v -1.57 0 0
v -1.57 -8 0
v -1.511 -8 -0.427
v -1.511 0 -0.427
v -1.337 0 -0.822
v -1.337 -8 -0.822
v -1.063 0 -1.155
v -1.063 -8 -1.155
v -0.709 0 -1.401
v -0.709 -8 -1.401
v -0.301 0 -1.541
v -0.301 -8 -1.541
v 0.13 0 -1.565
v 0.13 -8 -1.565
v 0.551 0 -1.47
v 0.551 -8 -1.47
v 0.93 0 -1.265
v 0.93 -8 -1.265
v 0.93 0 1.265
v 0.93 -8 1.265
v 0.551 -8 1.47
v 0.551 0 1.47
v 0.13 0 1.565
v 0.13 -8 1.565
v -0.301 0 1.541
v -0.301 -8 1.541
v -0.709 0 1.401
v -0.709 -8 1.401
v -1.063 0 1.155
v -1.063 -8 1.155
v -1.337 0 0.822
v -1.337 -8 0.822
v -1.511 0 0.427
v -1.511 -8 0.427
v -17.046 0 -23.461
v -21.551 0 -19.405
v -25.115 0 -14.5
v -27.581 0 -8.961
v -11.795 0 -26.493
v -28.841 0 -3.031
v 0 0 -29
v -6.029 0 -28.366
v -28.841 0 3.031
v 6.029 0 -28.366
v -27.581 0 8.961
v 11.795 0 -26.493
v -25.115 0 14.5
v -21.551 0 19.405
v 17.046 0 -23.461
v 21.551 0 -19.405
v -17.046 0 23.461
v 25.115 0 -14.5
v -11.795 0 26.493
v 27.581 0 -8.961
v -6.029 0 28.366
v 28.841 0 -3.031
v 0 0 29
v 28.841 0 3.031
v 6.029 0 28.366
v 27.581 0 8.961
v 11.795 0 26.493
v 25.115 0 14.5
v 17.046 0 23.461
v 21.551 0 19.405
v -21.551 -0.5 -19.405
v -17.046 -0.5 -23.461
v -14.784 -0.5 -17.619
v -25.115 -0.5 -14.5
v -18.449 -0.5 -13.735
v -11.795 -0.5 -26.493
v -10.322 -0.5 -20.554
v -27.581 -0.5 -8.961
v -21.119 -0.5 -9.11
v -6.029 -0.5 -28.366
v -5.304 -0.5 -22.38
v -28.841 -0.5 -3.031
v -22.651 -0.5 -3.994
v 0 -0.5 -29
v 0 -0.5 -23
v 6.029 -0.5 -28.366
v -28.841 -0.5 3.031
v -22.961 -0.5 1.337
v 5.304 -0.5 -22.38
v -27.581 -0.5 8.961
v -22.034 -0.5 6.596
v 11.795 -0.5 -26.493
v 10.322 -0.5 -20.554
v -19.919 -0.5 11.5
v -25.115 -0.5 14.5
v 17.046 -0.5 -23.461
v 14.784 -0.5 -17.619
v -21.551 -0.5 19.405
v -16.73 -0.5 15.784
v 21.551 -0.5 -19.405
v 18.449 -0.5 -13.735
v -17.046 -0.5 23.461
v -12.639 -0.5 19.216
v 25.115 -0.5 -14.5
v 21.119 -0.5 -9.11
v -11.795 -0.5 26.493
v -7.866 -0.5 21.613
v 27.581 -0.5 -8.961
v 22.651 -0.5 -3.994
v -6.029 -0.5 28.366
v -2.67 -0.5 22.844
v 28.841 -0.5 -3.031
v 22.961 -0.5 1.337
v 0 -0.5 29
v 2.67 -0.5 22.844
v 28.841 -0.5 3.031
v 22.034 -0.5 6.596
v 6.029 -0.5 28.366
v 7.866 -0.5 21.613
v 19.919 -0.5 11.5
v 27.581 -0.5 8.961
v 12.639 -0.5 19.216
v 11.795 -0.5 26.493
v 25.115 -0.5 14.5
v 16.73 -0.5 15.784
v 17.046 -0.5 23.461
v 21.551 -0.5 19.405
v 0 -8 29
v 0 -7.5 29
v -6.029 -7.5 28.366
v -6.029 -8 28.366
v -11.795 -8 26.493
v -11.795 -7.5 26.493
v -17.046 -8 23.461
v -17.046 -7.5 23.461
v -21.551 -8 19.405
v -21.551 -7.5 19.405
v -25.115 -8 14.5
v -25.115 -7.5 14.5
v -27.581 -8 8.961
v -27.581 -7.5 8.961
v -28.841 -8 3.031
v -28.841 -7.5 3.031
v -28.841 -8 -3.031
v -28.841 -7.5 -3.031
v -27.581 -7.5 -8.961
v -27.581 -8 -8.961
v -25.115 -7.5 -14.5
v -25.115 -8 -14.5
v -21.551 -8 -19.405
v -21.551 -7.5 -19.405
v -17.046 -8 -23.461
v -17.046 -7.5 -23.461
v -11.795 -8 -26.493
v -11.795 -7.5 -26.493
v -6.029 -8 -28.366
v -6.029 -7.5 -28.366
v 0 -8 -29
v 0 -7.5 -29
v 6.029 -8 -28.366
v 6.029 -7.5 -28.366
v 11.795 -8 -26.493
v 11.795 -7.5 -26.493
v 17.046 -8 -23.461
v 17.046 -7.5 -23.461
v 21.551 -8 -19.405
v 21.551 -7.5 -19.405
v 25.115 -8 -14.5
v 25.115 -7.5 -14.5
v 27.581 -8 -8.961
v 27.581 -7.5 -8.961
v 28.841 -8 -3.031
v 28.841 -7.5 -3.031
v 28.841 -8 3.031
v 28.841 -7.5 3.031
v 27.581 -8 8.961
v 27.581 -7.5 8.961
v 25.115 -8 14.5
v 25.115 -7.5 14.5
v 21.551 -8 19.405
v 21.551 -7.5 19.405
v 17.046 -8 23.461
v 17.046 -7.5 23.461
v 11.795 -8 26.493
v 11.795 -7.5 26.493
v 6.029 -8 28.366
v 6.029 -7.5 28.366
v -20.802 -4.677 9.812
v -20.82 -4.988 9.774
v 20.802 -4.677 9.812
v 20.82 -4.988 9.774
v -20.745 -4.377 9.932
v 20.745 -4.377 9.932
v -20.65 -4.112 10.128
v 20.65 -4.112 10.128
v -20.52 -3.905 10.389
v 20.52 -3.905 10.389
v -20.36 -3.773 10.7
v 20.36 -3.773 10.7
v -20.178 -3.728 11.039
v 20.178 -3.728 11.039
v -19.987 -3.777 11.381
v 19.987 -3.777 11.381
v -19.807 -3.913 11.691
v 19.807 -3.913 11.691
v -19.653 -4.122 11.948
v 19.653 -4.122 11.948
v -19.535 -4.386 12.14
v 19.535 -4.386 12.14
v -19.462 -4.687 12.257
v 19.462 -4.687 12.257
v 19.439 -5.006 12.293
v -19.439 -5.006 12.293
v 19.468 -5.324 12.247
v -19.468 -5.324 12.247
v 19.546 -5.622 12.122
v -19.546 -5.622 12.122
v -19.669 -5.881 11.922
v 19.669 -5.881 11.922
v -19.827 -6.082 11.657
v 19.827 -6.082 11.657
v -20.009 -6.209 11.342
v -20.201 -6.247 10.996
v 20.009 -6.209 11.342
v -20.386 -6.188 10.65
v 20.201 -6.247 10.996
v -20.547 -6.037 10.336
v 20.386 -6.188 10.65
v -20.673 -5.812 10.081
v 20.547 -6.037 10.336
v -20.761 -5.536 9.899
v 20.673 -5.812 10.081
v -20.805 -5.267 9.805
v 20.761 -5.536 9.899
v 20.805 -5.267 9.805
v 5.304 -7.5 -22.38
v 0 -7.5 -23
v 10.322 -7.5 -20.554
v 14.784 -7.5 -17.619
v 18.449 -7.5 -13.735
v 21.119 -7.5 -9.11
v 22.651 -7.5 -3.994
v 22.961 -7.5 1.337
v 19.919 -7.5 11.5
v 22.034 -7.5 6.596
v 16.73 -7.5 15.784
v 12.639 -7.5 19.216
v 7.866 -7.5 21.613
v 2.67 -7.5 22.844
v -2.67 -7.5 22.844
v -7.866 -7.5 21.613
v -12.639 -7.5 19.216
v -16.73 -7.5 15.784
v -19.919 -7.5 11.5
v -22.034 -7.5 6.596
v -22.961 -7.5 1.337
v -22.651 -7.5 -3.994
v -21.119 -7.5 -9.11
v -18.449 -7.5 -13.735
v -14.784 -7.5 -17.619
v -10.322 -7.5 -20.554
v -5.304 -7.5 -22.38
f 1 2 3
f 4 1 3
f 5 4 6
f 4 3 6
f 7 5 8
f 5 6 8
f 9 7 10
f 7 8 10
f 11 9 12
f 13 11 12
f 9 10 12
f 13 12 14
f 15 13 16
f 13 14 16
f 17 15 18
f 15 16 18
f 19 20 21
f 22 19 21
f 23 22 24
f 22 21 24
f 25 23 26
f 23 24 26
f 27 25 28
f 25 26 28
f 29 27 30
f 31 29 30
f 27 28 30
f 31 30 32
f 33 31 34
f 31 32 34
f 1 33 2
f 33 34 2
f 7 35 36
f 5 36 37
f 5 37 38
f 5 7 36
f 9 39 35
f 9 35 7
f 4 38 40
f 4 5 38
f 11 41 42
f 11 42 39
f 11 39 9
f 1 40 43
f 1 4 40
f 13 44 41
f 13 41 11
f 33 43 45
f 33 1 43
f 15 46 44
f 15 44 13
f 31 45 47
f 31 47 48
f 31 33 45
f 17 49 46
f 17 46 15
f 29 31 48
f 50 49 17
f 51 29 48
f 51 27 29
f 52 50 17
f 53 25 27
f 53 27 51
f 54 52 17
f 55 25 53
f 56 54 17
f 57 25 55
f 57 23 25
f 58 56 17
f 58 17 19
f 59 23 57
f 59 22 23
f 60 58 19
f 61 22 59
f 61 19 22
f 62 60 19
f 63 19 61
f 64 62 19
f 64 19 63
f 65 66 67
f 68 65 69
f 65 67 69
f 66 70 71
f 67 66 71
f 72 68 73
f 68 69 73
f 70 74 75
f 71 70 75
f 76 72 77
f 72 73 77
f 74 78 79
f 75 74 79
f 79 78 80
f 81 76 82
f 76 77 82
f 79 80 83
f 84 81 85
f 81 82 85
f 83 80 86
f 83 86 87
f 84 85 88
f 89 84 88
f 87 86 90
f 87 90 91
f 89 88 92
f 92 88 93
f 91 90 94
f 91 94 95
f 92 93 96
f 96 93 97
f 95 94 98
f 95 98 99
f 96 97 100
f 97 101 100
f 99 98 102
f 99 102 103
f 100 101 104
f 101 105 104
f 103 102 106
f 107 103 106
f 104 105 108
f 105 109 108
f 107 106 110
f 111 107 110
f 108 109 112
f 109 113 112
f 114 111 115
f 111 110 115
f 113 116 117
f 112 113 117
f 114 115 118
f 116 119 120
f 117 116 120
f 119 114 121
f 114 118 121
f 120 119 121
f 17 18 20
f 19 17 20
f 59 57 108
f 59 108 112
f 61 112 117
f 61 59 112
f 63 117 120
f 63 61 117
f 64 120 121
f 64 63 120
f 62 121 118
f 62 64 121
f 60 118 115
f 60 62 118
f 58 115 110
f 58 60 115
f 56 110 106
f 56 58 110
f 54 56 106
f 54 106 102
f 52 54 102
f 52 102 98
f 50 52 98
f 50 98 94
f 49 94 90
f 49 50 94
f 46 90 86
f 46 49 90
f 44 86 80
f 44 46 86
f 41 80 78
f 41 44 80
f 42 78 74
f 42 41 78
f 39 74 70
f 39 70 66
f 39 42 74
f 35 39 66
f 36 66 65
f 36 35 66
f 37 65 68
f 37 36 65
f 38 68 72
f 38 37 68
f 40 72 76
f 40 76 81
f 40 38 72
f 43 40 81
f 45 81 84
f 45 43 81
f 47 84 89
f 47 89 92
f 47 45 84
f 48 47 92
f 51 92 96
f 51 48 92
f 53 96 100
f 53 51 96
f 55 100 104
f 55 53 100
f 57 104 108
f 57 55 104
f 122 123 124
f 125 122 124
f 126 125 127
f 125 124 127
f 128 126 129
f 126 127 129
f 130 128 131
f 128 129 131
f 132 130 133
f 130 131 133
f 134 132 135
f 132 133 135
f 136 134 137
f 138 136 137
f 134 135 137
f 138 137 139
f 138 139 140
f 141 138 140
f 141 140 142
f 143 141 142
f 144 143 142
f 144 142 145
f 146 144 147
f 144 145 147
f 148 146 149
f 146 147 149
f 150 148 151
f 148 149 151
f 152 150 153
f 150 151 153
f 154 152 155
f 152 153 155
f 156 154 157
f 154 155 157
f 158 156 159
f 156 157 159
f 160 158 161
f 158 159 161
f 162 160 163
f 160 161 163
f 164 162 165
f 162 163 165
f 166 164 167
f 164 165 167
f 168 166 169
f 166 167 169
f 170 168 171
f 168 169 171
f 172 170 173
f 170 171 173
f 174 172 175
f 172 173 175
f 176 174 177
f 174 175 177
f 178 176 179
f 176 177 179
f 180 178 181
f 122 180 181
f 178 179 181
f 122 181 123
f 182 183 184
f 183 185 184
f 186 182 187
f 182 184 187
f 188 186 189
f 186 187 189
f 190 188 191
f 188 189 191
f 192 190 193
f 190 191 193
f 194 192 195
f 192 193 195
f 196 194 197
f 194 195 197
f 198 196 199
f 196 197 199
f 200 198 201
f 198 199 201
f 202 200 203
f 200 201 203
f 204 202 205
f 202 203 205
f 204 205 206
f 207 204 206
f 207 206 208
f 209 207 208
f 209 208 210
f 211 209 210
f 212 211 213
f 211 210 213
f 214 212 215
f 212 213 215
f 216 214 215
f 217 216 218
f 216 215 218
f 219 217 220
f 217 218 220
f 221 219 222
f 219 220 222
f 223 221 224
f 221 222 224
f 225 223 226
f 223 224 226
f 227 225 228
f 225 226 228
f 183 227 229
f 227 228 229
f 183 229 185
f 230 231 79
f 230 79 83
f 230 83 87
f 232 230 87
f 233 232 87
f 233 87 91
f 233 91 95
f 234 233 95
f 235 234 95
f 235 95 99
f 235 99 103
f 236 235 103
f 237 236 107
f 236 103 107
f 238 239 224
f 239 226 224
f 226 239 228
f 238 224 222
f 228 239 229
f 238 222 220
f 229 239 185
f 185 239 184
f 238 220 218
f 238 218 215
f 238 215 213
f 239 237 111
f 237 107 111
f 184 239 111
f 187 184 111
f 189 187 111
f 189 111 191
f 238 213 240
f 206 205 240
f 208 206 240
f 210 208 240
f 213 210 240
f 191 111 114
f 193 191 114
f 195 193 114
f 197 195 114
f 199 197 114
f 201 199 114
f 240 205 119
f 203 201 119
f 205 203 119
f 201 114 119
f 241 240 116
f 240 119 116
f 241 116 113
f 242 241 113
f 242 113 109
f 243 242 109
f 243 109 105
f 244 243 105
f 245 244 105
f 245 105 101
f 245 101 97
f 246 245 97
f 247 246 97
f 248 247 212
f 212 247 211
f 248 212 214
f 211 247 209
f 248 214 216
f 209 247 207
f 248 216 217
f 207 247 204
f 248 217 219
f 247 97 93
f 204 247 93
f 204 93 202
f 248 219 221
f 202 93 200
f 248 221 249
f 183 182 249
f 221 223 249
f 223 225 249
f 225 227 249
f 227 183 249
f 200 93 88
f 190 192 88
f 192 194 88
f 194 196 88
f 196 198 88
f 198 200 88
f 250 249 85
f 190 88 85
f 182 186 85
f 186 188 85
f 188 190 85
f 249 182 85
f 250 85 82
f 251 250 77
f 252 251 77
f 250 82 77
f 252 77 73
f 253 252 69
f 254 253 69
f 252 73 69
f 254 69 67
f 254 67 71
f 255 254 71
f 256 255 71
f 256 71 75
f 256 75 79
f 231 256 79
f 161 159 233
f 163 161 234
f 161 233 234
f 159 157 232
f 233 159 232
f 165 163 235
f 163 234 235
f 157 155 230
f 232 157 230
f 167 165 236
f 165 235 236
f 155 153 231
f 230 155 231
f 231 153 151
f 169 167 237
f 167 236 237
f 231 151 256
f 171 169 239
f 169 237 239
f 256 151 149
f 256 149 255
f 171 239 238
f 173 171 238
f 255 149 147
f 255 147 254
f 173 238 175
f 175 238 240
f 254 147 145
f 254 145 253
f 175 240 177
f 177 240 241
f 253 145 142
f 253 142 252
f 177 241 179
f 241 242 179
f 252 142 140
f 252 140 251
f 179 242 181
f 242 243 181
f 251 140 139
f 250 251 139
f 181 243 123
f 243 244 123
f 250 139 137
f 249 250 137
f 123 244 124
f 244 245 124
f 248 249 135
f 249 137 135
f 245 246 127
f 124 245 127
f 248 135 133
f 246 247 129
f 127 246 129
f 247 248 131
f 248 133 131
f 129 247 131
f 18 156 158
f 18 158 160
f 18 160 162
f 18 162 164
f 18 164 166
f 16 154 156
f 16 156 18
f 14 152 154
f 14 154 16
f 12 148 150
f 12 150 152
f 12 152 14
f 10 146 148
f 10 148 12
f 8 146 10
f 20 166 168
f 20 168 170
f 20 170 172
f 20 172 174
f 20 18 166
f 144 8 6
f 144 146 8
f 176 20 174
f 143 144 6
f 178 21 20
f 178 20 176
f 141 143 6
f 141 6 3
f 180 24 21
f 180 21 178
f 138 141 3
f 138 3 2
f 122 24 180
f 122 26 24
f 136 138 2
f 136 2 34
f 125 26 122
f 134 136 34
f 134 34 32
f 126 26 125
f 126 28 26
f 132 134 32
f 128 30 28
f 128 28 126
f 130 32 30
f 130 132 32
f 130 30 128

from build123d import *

# Parameters (mm, degrees)
SKETCH_1_R          = 9
EXTRUDE_1_DEPTH     = 8
CUT_EXTRUDE_1_DEPTH = 16.033296378
EXTRUDE_START       = -8
SKETCH_7_R          = 23
SKETCH_7_R_2        = 9
EXTRUDE_2_DEPTH     = 8
SKETCH_8_R          = 29
SKETCH_8_R_2        = 23
EXTRUDE_3_DEPTH     = 0.5
EXTRUDE_START_2     = -0.5
SKETCH_9_R          = 29
SKETCH_9_R_2        = 23
EXTRUDE_4_DEPTH     = 0.5
SKETCH_10_R         = 1.25977889
CUT_EXTRUDE_2_DEPTH = 25


with BuildPart() as part:
    # 草圖1 → 填料-伸長1 (new body)
    with BuildSketch(Plane(origin=(0, 0, 0), x_dir=(1, 0, 0), z_dir=(0, 1, 0))):
        with Locations(Location((0, 0, 0), (0, 0, 270))):
            Circle(SKETCH_1_R)
    extrude(amount=-EXTRUDE_1_DEPTH)

    # 草圖2 → 除料-伸長1 (cut, through all)
    with BuildSketch(Plane(origin=(0, -8, 0), x_dir=(-1, 0, 0), z_dir=(0, -1, 0))):
        with BuildLine():
            Line((-0.93, 1.264911064), (-0.93, -1.264911064))
            ThreePointArc((-0.93, -1.264911064), (0.708801806, -1.400892573), (1.57, 0))
            ThreePointArc((1.57, 0), (0.708801806, 1.400892573), (-0.93, 1.264911064))
        make_face()
    extrude(amount=-CUT_EXTRUDE_1_DEPTH, mode=Mode.SUBTRACT)

    # 草圖7 → 填料-伸長2 (add)
    with BuildSketch(Plane(origin=(0, -8, 0), x_dir=(-1, 0, 0), z_dir=(0, -1, 0)).offset(EXTRUDE_START)):
        with Locations(Location((0, 0, 0), (0, 0, 90))):
            Circle(SKETCH_7_R)
        Circle(SKETCH_7_R_2, mode=Mode.SUBTRACT)
    extrude(amount=EXTRUDE_2_DEPTH)

    # 草圖8 → 填料-伸長3 (add)
    with BuildSketch(Plane(origin=(0, 0, 0), x_dir=(1, 0, 0), z_dir=(0, 1, 0))):
        with Locations(Location((0, 0, 0), (0, 0, 270))):
            Circle(SKETCH_8_R)
        with Locations(Location((0, 0, 0), (0, 0, 90))):
            Circle(SKETCH_8_R_2, mode=Mode.SUBTRACT)
    extrude(amount=-EXTRUDE_3_DEPTH)

    # 草圖9 → 填料-伸長4 (add)
    with BuildSketch(Plane.XZ.offset(8).offset(EXTRUDE_START_2)):
        with Locations(Location((0, 0, 0), (0, 0, 90))):
            Circle(SKETCH_9_R)
        with Locations(Location((0, 0, 0), (0, 0, 270))):
            Circle(SKETCH_9_R_2, mode=Mode.SUBTRACT)
    extrude(amount=EXTRUDE_4_DEPTH)

    # 草圖10 → 除料-伸長2 (cut, symmetric)
    with BuildSketch(Plane(origin=(0, 0, 0), x_dir=(0, 0, -1), z_dir=(1, 0, 0))):
        with Locations((-11.0333289, -4.987601344)):
            Circle(SKETCH_10_R)
    extrude(amount=CUT_EXTRUDE_2_DEPTH, both=True, mode=Mode.SUBTRACT)


solid = part.part
